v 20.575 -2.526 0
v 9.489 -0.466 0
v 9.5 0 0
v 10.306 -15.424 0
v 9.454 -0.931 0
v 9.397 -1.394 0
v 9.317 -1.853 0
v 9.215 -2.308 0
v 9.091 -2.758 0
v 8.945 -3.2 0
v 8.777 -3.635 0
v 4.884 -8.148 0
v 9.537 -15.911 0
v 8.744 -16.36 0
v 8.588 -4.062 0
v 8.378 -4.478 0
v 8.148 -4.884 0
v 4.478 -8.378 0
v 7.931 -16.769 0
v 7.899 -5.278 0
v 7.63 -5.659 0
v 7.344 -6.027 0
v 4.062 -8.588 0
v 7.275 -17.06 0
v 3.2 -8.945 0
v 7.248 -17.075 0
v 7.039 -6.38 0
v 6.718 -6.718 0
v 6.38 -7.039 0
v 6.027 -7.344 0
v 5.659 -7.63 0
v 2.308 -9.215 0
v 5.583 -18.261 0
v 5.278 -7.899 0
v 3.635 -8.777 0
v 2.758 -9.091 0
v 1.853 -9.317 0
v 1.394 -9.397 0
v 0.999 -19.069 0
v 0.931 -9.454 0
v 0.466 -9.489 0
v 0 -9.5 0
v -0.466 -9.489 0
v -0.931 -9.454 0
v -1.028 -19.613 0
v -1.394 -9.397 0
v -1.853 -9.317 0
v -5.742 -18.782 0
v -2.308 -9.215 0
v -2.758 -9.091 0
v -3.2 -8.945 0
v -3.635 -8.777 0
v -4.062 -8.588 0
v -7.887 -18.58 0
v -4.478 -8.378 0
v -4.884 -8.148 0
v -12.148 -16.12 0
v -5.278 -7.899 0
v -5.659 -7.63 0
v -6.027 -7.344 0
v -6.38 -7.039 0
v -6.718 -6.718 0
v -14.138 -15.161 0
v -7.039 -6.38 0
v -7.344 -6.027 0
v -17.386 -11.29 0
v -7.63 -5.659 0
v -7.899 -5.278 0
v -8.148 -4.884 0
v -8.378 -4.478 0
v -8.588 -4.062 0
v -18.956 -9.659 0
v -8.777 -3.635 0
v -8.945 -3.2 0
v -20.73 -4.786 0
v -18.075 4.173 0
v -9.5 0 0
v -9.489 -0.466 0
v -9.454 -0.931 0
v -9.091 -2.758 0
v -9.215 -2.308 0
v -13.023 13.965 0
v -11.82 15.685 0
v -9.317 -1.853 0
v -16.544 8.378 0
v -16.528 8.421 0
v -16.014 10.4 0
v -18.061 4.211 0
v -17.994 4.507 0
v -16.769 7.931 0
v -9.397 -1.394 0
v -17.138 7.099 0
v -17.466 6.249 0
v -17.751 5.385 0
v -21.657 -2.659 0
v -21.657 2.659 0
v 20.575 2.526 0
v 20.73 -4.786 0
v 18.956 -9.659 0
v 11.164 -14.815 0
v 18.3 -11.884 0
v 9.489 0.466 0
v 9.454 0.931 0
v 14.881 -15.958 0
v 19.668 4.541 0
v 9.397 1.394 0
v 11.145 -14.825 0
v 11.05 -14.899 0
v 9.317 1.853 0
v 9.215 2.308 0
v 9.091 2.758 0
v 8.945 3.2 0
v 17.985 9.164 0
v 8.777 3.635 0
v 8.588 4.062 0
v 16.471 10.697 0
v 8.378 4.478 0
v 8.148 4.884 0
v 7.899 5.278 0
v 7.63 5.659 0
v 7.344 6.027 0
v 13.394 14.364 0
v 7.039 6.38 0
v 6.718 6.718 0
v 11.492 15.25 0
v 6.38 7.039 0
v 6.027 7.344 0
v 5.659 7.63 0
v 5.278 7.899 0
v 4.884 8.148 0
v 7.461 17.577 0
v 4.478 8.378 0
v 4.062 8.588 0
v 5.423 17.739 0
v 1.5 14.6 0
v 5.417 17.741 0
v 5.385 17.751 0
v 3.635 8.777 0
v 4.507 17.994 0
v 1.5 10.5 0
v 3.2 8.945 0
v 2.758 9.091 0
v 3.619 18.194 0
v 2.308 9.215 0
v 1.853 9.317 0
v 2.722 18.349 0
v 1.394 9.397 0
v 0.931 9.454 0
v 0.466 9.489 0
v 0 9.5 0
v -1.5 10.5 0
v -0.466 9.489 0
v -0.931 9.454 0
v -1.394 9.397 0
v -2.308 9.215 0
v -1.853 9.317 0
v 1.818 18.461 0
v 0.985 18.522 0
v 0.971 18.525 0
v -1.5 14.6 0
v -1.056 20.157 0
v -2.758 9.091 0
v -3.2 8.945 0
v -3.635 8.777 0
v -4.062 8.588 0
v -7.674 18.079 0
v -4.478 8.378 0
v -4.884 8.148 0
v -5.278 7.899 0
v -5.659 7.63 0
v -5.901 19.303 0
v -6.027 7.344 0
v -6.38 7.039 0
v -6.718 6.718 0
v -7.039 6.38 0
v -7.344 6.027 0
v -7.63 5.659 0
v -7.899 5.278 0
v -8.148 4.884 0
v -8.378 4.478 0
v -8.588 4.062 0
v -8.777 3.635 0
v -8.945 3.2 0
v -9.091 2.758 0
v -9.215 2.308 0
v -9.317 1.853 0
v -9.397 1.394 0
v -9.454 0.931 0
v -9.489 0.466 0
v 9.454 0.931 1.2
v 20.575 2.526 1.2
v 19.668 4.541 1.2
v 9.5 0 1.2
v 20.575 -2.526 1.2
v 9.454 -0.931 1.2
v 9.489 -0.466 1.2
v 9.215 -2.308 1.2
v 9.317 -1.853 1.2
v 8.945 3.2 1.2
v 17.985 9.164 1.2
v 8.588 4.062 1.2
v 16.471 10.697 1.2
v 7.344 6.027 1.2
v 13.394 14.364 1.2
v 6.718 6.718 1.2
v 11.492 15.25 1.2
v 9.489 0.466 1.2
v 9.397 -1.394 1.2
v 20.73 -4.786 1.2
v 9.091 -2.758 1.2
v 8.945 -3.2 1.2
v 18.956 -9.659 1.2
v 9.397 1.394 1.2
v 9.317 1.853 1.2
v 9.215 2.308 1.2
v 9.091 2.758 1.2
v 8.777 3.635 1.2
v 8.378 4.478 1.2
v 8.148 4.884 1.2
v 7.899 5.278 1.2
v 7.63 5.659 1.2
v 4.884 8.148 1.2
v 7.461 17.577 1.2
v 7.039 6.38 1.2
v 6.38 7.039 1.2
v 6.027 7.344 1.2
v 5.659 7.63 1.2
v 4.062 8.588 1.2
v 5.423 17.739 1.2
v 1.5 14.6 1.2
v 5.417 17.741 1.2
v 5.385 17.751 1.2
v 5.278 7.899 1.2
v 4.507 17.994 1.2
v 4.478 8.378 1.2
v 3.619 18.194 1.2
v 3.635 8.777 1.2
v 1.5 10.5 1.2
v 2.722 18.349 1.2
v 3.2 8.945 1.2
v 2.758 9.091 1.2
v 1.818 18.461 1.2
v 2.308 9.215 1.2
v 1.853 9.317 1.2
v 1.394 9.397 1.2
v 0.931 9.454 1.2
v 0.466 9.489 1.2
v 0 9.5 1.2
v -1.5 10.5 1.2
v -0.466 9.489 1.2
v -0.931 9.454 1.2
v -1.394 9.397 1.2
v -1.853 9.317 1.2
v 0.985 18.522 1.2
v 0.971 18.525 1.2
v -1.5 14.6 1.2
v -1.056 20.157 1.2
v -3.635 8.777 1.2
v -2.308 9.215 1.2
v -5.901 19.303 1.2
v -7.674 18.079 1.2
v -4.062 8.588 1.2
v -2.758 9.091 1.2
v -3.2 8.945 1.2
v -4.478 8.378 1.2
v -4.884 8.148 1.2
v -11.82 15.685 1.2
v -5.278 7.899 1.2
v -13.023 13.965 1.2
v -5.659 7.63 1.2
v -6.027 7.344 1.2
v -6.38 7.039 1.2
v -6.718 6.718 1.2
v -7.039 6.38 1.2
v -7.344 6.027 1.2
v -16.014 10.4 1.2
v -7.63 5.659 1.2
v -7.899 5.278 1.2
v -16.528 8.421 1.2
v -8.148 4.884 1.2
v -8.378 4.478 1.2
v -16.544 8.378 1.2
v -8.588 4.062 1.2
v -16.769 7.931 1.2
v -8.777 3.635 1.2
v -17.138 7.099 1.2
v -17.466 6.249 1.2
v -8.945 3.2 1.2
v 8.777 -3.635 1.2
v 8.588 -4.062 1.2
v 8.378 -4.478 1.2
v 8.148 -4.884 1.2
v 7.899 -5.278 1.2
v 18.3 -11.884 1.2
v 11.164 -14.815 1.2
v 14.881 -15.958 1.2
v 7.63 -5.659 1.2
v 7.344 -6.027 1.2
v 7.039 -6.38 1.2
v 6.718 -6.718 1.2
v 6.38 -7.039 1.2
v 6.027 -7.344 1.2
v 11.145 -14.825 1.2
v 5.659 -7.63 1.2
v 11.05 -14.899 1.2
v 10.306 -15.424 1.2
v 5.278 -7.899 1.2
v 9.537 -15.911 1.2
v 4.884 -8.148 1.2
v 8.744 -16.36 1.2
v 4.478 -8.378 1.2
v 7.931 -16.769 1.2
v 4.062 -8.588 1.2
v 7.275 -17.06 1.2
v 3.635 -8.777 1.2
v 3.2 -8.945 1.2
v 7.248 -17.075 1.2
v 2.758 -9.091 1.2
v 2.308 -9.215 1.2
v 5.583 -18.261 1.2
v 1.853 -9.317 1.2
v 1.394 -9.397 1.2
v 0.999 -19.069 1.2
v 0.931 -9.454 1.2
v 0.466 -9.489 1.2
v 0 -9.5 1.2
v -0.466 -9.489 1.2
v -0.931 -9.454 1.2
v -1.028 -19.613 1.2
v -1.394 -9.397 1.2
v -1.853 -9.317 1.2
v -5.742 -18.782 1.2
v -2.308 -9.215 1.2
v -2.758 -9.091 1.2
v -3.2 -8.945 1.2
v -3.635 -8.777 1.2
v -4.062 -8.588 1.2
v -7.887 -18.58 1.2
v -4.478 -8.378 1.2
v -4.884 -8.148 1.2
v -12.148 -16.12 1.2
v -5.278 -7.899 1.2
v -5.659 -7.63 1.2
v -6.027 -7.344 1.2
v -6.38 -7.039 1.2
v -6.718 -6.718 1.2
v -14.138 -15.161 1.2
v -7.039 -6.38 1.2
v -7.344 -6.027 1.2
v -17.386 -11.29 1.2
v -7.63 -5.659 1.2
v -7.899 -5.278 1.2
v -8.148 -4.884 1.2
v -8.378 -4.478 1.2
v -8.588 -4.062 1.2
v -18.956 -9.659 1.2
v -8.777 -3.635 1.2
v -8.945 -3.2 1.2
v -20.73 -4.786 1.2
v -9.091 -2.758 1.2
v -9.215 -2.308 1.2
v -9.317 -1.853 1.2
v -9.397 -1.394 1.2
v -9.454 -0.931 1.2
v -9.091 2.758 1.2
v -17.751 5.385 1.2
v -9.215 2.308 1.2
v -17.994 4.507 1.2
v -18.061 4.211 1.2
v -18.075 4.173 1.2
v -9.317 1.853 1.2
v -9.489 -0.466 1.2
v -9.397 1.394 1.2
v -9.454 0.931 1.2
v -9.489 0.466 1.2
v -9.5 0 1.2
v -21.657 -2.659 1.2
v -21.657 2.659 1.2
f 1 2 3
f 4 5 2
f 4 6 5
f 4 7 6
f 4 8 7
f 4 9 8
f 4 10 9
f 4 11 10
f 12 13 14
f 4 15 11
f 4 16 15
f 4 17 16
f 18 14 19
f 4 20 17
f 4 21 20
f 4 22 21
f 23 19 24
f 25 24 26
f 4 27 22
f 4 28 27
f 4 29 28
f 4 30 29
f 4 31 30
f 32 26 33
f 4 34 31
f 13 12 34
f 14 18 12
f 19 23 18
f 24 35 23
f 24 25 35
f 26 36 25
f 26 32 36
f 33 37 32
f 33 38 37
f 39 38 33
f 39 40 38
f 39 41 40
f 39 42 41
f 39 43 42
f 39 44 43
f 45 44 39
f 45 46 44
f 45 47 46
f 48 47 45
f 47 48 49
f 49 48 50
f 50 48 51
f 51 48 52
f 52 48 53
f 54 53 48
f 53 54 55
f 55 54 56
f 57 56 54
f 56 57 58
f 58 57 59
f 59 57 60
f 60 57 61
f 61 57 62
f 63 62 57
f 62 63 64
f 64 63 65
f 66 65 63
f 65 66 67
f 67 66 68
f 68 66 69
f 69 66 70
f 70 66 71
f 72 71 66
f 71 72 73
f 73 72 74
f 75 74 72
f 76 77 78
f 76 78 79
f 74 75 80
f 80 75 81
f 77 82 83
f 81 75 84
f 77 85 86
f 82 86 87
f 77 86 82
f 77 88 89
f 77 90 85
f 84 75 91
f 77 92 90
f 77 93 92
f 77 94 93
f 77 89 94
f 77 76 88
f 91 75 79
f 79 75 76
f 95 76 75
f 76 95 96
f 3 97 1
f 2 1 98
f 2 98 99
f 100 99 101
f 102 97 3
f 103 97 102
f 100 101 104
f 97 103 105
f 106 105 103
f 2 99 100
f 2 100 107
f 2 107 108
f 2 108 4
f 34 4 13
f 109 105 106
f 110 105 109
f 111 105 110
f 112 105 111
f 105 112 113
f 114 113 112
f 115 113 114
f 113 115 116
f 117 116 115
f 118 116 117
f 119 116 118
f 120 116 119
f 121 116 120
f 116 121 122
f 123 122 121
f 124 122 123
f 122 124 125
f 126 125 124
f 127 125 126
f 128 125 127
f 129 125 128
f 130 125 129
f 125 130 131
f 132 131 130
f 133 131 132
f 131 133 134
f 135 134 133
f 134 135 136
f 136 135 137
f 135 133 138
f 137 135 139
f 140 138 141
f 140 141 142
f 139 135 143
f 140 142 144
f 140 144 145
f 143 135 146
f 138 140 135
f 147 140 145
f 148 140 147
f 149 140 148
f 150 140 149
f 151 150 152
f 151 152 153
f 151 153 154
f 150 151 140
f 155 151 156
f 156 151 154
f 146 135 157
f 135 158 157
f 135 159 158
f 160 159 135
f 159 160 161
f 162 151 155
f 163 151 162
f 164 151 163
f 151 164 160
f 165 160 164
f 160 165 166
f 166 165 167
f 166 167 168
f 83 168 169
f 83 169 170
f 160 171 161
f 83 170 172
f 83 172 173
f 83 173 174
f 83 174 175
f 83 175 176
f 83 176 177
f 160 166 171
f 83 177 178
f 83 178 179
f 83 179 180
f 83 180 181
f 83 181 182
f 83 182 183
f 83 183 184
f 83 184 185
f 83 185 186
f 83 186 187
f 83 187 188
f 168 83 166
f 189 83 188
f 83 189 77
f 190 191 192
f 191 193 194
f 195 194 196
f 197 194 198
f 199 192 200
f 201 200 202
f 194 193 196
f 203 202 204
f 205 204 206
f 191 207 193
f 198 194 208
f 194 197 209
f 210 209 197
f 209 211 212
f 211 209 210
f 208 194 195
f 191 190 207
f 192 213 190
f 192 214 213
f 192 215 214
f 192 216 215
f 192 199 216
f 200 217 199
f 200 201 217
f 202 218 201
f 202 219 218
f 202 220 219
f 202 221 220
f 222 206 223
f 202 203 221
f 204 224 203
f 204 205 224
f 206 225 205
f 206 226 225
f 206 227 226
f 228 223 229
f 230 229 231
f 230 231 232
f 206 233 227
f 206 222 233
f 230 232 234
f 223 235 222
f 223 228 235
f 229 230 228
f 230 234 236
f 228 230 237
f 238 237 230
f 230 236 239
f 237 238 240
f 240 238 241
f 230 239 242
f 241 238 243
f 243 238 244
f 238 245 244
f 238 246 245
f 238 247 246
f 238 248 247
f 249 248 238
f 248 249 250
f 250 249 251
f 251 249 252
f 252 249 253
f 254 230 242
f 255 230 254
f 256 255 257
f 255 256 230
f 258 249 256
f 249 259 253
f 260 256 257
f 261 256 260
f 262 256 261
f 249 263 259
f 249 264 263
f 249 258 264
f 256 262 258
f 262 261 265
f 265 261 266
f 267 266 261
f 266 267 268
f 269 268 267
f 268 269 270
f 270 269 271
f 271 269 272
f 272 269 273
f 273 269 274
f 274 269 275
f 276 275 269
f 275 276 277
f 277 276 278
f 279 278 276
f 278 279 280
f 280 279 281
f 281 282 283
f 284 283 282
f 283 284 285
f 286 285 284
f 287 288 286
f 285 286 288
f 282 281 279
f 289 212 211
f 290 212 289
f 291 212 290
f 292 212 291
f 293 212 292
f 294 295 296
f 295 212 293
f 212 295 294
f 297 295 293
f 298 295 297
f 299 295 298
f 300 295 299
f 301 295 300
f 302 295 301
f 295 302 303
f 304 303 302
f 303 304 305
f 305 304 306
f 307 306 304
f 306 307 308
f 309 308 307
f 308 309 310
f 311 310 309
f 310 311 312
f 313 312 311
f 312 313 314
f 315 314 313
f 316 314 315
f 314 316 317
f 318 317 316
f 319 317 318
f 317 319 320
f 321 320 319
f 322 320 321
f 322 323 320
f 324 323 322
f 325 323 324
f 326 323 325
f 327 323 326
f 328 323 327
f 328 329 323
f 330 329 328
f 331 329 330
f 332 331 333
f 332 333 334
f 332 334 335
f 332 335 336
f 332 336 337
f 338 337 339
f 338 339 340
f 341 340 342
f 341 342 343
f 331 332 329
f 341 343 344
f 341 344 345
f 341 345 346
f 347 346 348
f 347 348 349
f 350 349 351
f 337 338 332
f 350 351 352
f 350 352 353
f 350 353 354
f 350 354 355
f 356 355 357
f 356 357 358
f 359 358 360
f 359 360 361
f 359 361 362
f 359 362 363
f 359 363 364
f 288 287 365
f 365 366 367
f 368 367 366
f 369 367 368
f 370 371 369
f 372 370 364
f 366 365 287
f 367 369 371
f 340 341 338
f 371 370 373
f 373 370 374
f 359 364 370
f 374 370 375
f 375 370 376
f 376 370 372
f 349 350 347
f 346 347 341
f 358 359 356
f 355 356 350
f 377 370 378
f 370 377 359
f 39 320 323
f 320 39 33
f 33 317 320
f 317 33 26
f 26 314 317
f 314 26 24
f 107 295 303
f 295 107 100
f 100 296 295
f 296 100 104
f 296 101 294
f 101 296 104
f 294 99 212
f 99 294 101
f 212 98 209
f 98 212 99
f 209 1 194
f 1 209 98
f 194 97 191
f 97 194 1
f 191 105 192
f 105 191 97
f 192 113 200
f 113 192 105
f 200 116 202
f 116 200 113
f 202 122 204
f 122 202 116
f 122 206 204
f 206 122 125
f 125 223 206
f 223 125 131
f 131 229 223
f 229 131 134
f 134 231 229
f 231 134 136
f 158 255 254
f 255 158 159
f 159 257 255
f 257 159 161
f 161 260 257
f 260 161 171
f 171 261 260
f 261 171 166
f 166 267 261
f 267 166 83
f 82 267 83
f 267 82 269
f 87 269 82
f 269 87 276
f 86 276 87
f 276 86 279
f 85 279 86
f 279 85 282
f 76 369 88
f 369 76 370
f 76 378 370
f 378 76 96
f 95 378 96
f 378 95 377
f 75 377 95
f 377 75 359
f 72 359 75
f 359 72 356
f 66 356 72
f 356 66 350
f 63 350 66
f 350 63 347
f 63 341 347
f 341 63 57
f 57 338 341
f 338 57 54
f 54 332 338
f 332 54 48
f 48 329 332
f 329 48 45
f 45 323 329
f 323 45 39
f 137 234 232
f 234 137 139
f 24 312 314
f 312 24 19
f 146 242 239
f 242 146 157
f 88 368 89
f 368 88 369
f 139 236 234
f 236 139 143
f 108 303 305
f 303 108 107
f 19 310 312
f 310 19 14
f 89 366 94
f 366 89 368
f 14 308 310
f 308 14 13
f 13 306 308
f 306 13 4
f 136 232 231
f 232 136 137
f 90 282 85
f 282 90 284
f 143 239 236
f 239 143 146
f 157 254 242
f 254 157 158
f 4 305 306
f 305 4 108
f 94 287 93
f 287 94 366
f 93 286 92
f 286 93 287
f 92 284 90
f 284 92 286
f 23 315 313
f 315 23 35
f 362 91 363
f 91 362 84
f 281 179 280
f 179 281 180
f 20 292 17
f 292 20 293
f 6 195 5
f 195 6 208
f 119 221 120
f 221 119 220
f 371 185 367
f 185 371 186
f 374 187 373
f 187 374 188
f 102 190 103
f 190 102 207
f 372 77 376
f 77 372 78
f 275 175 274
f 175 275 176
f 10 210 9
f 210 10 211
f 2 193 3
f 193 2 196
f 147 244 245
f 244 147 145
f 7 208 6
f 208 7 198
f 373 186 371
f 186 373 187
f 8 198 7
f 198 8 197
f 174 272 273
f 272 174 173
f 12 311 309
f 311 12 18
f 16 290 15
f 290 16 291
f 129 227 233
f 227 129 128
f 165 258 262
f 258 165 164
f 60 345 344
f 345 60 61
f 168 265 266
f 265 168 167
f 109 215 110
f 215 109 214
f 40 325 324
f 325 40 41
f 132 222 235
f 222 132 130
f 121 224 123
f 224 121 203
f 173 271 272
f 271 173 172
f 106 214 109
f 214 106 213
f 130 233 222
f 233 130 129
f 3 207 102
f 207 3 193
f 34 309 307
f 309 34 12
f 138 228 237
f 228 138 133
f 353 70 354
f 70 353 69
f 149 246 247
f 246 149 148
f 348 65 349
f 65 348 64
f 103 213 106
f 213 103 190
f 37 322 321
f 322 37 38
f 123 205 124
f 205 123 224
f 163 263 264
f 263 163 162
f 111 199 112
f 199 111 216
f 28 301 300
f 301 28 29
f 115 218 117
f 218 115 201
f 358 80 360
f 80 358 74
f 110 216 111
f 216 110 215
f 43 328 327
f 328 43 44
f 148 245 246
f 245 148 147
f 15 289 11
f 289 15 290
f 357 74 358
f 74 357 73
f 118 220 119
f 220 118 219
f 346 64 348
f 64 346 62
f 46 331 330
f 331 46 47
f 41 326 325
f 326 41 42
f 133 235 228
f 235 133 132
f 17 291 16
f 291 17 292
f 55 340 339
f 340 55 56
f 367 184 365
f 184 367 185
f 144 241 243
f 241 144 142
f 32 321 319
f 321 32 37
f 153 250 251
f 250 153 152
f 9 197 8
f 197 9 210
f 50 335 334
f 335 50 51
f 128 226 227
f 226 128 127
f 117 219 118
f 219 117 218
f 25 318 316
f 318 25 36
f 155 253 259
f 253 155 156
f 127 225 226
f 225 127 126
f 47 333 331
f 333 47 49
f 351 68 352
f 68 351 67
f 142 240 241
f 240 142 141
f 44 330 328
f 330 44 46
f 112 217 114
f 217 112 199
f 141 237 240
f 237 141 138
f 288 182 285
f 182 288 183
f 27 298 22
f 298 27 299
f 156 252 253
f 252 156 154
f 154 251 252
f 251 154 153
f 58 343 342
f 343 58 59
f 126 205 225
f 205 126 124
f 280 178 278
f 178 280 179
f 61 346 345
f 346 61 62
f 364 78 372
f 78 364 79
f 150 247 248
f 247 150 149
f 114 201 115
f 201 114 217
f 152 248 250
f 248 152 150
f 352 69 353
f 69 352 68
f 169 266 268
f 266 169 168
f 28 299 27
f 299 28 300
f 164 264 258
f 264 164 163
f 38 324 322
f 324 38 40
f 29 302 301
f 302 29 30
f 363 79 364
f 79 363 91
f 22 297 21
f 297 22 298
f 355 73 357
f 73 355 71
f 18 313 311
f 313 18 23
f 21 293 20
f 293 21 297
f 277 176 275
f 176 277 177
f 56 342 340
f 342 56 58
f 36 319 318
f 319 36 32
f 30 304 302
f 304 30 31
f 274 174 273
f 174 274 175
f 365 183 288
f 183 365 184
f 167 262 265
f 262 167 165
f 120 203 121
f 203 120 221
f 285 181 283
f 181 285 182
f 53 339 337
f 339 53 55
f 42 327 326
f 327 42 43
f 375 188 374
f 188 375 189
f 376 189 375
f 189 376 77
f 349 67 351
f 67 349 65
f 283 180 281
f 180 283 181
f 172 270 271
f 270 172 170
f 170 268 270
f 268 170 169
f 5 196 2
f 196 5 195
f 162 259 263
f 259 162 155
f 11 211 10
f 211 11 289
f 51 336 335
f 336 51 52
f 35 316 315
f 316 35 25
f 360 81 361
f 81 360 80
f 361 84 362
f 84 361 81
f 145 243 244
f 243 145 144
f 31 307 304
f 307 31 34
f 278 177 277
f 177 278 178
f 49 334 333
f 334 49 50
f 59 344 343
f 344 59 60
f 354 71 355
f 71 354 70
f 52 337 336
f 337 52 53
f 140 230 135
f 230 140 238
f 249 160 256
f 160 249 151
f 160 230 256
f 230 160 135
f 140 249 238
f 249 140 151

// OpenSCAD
/*
  Elna Supermatic cam 32
  Name: Slanted bars
  Status: candidate

  Generated from measured parametric base v2.
  Surface mode: stepped
*/

include <_elna_measured_common.scad>;

profile_points = [
        [0.9708, 18.5246],
        [5.4235, 17.7395],
        [7.4610, 17.5770],
        [11.4917, 15.2499],
        [13.3944, 14.3638],
        [16.4715, 10.6967],
        [17.9850, 9.1638],
        [19.6677, 4.5406],
        [20.5755, 2.5264],
        [20.5755, -2.5264],
        [20.7297, -4.7858],
        [18.9562, -9.6586],
        [18.2998, -11.8840],
        [14.8812, -15.9581],
        [11.1637, -14.8147],
        [7.2481, -17.0754],
        [5.5828, -18.2606],
        [0.9994, -19.0688],
        [-1.0279, -19.6131],
        [-5.7422, -18.7818],
        [-7.8869, -18.5804],
        [-12.1476, -16.1205],
        [-14.1378, -15.1610],
        [-17.3856, -11.2904],
        [-18.9562, -9.6586],
        [-20.7297, -4.7858],
        [-21.6574, -2.6592],
        [-21.6574, 2.6592],
        [-18.0746, 4.1728],
        [-16.5282, 8.4215],
        [-16.0144, 10.3999],
        [-13.0228, 13.9652],
        [-11.8196, 15.6852],
        [-7.6740, 18.0787],
        [-5.9015, 19.3030],
        [-1.0564, 20.1573]
];

icon_points = [[-1.000,0.180], [-0.820,0.180], [-0.820,0.360], [-0.640,0.360], [-0.640,0.560], [-0.460,0.560], [-0.460,0.740], [-0.280,0.740], [-0.280,0.560], [-0.100,0.560], [-0.100,0.360], [0.080,0.360], [0.080,0.180], [0.260,0.180], [0.260,0.360], [0.440,0.360], [0.440,0.560], [0.620,0.560], [0.620,0.740], [0.800,0.740], [1.000,0.740]];

elna_cam_ring(profile_points=profile_points);
